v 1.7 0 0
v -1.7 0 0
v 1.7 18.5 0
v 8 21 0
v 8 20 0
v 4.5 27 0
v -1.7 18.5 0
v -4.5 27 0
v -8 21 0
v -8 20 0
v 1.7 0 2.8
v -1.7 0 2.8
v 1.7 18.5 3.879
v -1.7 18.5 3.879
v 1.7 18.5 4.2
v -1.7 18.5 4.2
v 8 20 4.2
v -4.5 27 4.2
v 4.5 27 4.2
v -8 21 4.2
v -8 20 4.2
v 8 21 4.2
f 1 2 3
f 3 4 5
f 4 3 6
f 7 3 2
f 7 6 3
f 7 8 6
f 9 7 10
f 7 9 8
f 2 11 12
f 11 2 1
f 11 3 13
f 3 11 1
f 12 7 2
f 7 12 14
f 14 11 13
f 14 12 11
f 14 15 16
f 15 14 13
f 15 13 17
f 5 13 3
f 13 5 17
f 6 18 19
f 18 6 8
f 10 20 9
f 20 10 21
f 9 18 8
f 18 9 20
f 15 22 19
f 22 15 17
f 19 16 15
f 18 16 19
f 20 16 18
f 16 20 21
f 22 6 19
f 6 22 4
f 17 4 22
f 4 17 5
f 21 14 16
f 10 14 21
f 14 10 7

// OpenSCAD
// Three cap-down tubes, one motor: all rotate together on separate axes.
// Cap outside diameter supplied by user: 17 mm. Motor fit remains unverified.
part = "locking_key"; // preview only. Export base, socket_gear, idler, pinion, foot, washer separately.
show_tubes = false; // hide illustrative tubes; never export assembly for printing
cap_diameter = 17; // 1.7 cm cap outside diameter
cap_height = 10;
tube_diameter = 13;
tube_height = 95;
cap_clearance = 0.6; // 17.6 mm socket bore: 0.3 mm per side for fit / paper shim
motor_hole_pitch = 35;
motor_ear_offset = 8; // shaft is offset from mounting-ear line; verify on your motor
shaft_diameter = 5.1;
shaft_flat_width = 3.2;
gear_module = 1;
output_teeth = 40;
small_teeth = 20;
gear_height = 5;
pressure_angle = 20;
backlash = 0.18; // total tooth thickness reduction at pitch circle, mm
post_diameter = 10;
post_clearance = 0.4;
base_thickness = 3;
foot_height = 42; // clear space below plate; legs lock with printed tapered keys
peg_width = 8;
peg_clearance = 0.4;
key_width = 3.4;
key_slot_width = 3.8;
motor_ear_gap = 1.8; // nominal 1.5 mm ears; wedge draws bracket toward board
motor_clip_thickness = 3;
motor_peg_offset = 10.5; // outboard of each mounting-ear hole
pinion_lift = 0.6; // nominal clearance over the motor's unflattened shaft shoulder
floor_height = 13;
socket_depth = 9;
running_gap = 0.6; // separate printed thrust washer supports each free-spinning gear
center_distance = gear_module*(output_teeth+small_teeth)/2;
station_pitch = 2*center_distance;
$fn = 96;

assert(cap_diameter > 0 && cap_diameter+6 < gear_module*(output_teeth-2.5),
       "Cap is too wide for this gear; increase output gear size.");
function polar(r,a)=[r*cos(a),r*sin(a)];
function involute(a)=tan(a)-a*PI/180;
function flank_angle(r,rb,rp,n)=90/n-backlash/(2*rp)*180/PI
    +(involute(pressure_angle)-involute(acos(rb/r)))*180/PI;

module gear2d(n) {
    rp=gear_module*n/2;
    rb=rp*cos(pressure_angle);
    rr=rp-1.25*gear_module;
    ra=rp+gear_module;
    start=max(rr,rb);
    steps=12;
    left=[for(i=[0:steps]) let(r=start+(ra-start)*i/steps)
        polar(r,flank_angle(r,rb,rp,n))];
    right=[for(i=[steps:-1:0]) let(r=start+(ra-start)*i/steps)
        polar(r,-flank_angle(r,rb,rp,n))];
    union() {
        circle(r=rr);
        for(i=[0:n-1]) rotate(i*360/n)
            polygon(concat([polar(rr-0.05,flank_angle(start,rb,rp,n))],left,right,
                           [polar(rr-0.05,-flank_angle(start,rb,rp,n))]));
    }
}

module base() {
    difference() {
        union() {
            translate([-station_pitch-35,-50,0])
                cube([2*station_pitch+70,90,base_thickness]);
            for(x=[-station_pitch,0,station_pitch])
                translate([x,0,base_thickness]) cylinder(h=15,d=post_diameter);
            for(x=[-center_distance,center_distance])
                translate([x,0,base_thickness]) cylinder(h=4.8,d=post_diameter);
        }
        translate([0,-center_distance,-1]) cylinder(h=base_thickness+2,d=12);
        // Two removable printed motor brackets pass through square sockets.
        for(x=[-1,1])
            translate([x*(motor_hole_pitch/2+motor_peg_offset),-center_distance+motor_ear_offset,-1])
                linear_extrude(base_thickness+2) square(peg_width+peg_clearance,center=true);
        // Legs register in square sockets; printed keys retain them above the board.
        for(x=[-station_pitch-25,station_pitch+25],y=[-40,30])
            translate([x,y,-1]) linear_extrude(base_thickness+2)
                square(peg_width+peg_clearance,center=true);
    }
}
module socket_gear() {
    difference() {
        union() {
            linear_extrude(height=gear_height,convexity=10) gear2d(output_teeth);
            translate([0,0,gear_height])
                cylinder(h=floor_height+socket_depth,d=cap_diameter+6);
        }
        translate([0,0,-0.1]) cylinder(h=15.3,d=post_diameter+post_clearance);
        translate([0,0,gear_height+floor_height])
            cylinder(h=socket_depth+0.1,d=cap_diameter+cap_clearance);
    }
}
module idler() {
    difference() {
        linear_extrude(height=gear_height,convexity=10) gear2d(small_teeth);
        translate([0,0,-0.1]) cylinder(h=gear_height+0.2,d=post_diameter+post_clearance);
    }
}
module pinion() {
    difference() {
        linear_extrude(height=gear_height,convexity=10) gear2d(small_teeth);
        translate([0,0,-0.1]) linear_extrude(gear_height+0.2)
            intersection() {
                circle(d=shaft_diameter);
                square([shaft_flat_width,shaft_diameter+1],center=true);
            }
    }
}
module foot(height=foot_height) {
    difference() {
        union() {
            cylinder(h=height,d=18);
            translate([-peg_width/2,-peg_width/2,height-0.1])
                cube([peg_width,peg_width,base_thickness+6.1]);
        }
        translate([-key_slot_width/2,-peg_width/2-1,height+base_thickness-0.2])
            cube([key_slot_width,peg_width+2,3.7]);
    }
}
module test_peg() { foot(6); }
module locking_key() {
    // Flat underside on print bed. Slide the thin end through the peg slot.
    // The long taper replaces a bolt; finger-tight only, no snap flexure.
    polyhedron(points=[[-key_width/2,0,0],[key_width/2,0,0],
        [key_width/2,24,0],[-key_width/2,24,0],
        [-key_width/2,0,2.8],[key_width/2,0,2.8],
        [key_width/2,24,4.2],[-key_width/2,24,4.2]],
        faces=[[0,3,2,1],[0,1,5,4],[1,2,6,5],[2,3,7,6],[3,0,4,7],[4,5,6,7]],convexity=4);
    // Wider paddle grip adds bed contact without enlarging the mating stem.
    // Tapered outer corners clear the adjacent gears on both motor brackets.
    linear_extrude(4.2) polygon([
        [-key_width/2,18.5],[-8,20],[-8,21],[-4.5,27],
        [4.5,27],[8,21],[8,20],[key_width/2,18.5]]);
}
module motor_clip() {
    difference() {
        union() {
            // Pad under one motor ear; body remains clear inboard of the pad.
            translate([-3,-5,0]) cube([motor_peg_offset+7,10,motor_clip_thickness]);
            translate([0,0,motor_clip_thickness-0.1]) cylinder(h=1.3,d=3.6);
            translate([motor_peg_offset-peg_width/2,-peg_width/2,motor_clip_thickness-0.1])
                cube([peg_width,peg_width,motor_ear_gap+base_thickness+6.1]);
        }
        translate([motor_peg_offset-peg_width/2-1,-key_slot_width/2,
                   motor_clip_thickness+motor_ear_gap+base_thickness-0.2])
            cube([peg_width+2,key_slot_width,3.7]);
    }
}
module fit_coupon() {
    // Optional quick check for a leg/bracket peg and key; same thickness as base.
    difference() {
        translate([-10,-10,0]) cube([20,20,base_thickness]);
        translate([0,0,-0.1]) linear_extrude(base_thickness+0.2)
            square(peg_width+peg_clearance,center=true);
    }
}
module washer() {
    difference() {
        cylinder(h=running_gap,d=16);
        translate([0,0,-0.1]) cylinder(h=running_gap+0.2,d=post_diameter+0.5);
    }
}
module tube_example() {
    color("MediumPurple") cylinder(h=cap_height,d=cap_diameter);
    color([0.65,0.83,0.92,0.45]) translate([0,0,cap_height])
        cylinder(h=tube_height,d=tube_diameter);
    color("Ivory") translate([0,0,cap_height+20])
        difference() {
            cylinder(h=45,d=tube_diameter+0.4);
            translate([0,0,-0.1]) cylinder(h=45.2,d=tube_diameter);
        }
}
module motor_example() {
    // Nominal datasheet envelope, not a printable motor or verified physical fit.
    color("DimGray") difference() {
        union() {
            cylinder(h=19,d=28);
            for(side=[-1,1]) translate([0,0,17.5]) linear_extrude(1.5)
                hull() { circle(d=7); translate([side*motor_hole_pitch/2,0]) circle(d=7); }
        }
        for(side=[-1,1]) translate([side*motor_hole_pitch/2,0,17.4]) cylinder(h=1.7,d=4.2);
    }
    color("Silver") translate([0,-motor_ear_offset,19]) {
        cylinder(h=4,d=5);
        translate([0,0,4]) linear_extrude(6)
            intersection() { circle(d=5); square([3,6],center=true); }
    }
}
module assembly() {
    z=foot_height+base_thickness+running_gap;
    color("SlateGray") translate([0,0,foot_height]) base();
    for(x=[-station_pitch-25,station_pitch+25],y=[-40,30])
        color("SlateGray") translate([x,y,0]) foot();
    for(x=[-station_pitch-25,station_pitch+25],y=[-40,30])
        color("MediumSeaGreen") translate([x,y-8,foot_height+base_thickness]) locking_key();
    for(side=[-1,1]) {
        color("Coral") translate([side*motor_hole_pitch/2,-center_distance+motor_ear_offset,
                                foot_height-motor_ear_gap-motor_clip_thickness])
            scale([side,1,1]) motor_clip();
        color("MediumSeaGreen") translate([side*(motor_hole_pitch/2+motor_peg_offset),
                                -center_distance+motor_ear_offset,foot_height+base_thickness])
            rotate([0,0,-90*side]) translate([0,-8,0]) locking_key();
    }
    for(x=[-station_pitch,0,station_pitch]) {
        color("Silver") translate([x,0,foot_height+base_thickness]) washer();
        color("SteelBlue") translate([x,0,z]) socket_gear();
        if(show_tubes) translate([x,0,z+gear_height+floor_height]) tube_example();
    }
    for(x=[-center_distance,center_distance])
        color("Orange") translate([x,0,z]) rotate(180/small_teeth) idler();
    for(x=[-center_distance,center_distance])
        color("Silver") translate([x,0,foot_height+base_thickness]) washer();
    color("Goldenrod") translate([0,-center_distance,z+pinion_lift]) rotate(180/small_teeth) pinion();
    translate([0,-center_distance+motor_ear_offset,foot_height-19]) motor_example();
}
module print_layout() {
    // Detached parts for the first plate; base is printed on a separate plate.
    for(x=[25,75,125]) color("SteelBlue") translate([x,25,0]) socket_gear();
    for(x=[25,55]) color("Orange") translate([x,65,0]) idler();
    color("Goldenrod") translate([85,65,0]) pinion();
    for(x=[20,45,70,95]) color("SlateGray") translate([x,100,0]) foot();
    for(x=[20,45,70,95,120]) color("Silver") translate([x,130,0]) washer();
}
if(part=="assembly") assembly();
else if(part=="print_layout") print_layout();
else if(part=="base") base();
else if(part=="socket_gear") socket_gear();
else if(part=="idler") idler();
else if(part=="pinion") pinion();
else if(part=="foot") foot();
else if(part=="motor_clip") motor_clip();
else if(part=="locking_key") locking_key();
else if(part=="fit_coupon") fit_coupon();
else if(part=="test_peg") test_peg();
else if(part=="washer") washer();
else assert(false,"Choose assembly, base, socket_gear, idler, pinion, foot, or washer.");
